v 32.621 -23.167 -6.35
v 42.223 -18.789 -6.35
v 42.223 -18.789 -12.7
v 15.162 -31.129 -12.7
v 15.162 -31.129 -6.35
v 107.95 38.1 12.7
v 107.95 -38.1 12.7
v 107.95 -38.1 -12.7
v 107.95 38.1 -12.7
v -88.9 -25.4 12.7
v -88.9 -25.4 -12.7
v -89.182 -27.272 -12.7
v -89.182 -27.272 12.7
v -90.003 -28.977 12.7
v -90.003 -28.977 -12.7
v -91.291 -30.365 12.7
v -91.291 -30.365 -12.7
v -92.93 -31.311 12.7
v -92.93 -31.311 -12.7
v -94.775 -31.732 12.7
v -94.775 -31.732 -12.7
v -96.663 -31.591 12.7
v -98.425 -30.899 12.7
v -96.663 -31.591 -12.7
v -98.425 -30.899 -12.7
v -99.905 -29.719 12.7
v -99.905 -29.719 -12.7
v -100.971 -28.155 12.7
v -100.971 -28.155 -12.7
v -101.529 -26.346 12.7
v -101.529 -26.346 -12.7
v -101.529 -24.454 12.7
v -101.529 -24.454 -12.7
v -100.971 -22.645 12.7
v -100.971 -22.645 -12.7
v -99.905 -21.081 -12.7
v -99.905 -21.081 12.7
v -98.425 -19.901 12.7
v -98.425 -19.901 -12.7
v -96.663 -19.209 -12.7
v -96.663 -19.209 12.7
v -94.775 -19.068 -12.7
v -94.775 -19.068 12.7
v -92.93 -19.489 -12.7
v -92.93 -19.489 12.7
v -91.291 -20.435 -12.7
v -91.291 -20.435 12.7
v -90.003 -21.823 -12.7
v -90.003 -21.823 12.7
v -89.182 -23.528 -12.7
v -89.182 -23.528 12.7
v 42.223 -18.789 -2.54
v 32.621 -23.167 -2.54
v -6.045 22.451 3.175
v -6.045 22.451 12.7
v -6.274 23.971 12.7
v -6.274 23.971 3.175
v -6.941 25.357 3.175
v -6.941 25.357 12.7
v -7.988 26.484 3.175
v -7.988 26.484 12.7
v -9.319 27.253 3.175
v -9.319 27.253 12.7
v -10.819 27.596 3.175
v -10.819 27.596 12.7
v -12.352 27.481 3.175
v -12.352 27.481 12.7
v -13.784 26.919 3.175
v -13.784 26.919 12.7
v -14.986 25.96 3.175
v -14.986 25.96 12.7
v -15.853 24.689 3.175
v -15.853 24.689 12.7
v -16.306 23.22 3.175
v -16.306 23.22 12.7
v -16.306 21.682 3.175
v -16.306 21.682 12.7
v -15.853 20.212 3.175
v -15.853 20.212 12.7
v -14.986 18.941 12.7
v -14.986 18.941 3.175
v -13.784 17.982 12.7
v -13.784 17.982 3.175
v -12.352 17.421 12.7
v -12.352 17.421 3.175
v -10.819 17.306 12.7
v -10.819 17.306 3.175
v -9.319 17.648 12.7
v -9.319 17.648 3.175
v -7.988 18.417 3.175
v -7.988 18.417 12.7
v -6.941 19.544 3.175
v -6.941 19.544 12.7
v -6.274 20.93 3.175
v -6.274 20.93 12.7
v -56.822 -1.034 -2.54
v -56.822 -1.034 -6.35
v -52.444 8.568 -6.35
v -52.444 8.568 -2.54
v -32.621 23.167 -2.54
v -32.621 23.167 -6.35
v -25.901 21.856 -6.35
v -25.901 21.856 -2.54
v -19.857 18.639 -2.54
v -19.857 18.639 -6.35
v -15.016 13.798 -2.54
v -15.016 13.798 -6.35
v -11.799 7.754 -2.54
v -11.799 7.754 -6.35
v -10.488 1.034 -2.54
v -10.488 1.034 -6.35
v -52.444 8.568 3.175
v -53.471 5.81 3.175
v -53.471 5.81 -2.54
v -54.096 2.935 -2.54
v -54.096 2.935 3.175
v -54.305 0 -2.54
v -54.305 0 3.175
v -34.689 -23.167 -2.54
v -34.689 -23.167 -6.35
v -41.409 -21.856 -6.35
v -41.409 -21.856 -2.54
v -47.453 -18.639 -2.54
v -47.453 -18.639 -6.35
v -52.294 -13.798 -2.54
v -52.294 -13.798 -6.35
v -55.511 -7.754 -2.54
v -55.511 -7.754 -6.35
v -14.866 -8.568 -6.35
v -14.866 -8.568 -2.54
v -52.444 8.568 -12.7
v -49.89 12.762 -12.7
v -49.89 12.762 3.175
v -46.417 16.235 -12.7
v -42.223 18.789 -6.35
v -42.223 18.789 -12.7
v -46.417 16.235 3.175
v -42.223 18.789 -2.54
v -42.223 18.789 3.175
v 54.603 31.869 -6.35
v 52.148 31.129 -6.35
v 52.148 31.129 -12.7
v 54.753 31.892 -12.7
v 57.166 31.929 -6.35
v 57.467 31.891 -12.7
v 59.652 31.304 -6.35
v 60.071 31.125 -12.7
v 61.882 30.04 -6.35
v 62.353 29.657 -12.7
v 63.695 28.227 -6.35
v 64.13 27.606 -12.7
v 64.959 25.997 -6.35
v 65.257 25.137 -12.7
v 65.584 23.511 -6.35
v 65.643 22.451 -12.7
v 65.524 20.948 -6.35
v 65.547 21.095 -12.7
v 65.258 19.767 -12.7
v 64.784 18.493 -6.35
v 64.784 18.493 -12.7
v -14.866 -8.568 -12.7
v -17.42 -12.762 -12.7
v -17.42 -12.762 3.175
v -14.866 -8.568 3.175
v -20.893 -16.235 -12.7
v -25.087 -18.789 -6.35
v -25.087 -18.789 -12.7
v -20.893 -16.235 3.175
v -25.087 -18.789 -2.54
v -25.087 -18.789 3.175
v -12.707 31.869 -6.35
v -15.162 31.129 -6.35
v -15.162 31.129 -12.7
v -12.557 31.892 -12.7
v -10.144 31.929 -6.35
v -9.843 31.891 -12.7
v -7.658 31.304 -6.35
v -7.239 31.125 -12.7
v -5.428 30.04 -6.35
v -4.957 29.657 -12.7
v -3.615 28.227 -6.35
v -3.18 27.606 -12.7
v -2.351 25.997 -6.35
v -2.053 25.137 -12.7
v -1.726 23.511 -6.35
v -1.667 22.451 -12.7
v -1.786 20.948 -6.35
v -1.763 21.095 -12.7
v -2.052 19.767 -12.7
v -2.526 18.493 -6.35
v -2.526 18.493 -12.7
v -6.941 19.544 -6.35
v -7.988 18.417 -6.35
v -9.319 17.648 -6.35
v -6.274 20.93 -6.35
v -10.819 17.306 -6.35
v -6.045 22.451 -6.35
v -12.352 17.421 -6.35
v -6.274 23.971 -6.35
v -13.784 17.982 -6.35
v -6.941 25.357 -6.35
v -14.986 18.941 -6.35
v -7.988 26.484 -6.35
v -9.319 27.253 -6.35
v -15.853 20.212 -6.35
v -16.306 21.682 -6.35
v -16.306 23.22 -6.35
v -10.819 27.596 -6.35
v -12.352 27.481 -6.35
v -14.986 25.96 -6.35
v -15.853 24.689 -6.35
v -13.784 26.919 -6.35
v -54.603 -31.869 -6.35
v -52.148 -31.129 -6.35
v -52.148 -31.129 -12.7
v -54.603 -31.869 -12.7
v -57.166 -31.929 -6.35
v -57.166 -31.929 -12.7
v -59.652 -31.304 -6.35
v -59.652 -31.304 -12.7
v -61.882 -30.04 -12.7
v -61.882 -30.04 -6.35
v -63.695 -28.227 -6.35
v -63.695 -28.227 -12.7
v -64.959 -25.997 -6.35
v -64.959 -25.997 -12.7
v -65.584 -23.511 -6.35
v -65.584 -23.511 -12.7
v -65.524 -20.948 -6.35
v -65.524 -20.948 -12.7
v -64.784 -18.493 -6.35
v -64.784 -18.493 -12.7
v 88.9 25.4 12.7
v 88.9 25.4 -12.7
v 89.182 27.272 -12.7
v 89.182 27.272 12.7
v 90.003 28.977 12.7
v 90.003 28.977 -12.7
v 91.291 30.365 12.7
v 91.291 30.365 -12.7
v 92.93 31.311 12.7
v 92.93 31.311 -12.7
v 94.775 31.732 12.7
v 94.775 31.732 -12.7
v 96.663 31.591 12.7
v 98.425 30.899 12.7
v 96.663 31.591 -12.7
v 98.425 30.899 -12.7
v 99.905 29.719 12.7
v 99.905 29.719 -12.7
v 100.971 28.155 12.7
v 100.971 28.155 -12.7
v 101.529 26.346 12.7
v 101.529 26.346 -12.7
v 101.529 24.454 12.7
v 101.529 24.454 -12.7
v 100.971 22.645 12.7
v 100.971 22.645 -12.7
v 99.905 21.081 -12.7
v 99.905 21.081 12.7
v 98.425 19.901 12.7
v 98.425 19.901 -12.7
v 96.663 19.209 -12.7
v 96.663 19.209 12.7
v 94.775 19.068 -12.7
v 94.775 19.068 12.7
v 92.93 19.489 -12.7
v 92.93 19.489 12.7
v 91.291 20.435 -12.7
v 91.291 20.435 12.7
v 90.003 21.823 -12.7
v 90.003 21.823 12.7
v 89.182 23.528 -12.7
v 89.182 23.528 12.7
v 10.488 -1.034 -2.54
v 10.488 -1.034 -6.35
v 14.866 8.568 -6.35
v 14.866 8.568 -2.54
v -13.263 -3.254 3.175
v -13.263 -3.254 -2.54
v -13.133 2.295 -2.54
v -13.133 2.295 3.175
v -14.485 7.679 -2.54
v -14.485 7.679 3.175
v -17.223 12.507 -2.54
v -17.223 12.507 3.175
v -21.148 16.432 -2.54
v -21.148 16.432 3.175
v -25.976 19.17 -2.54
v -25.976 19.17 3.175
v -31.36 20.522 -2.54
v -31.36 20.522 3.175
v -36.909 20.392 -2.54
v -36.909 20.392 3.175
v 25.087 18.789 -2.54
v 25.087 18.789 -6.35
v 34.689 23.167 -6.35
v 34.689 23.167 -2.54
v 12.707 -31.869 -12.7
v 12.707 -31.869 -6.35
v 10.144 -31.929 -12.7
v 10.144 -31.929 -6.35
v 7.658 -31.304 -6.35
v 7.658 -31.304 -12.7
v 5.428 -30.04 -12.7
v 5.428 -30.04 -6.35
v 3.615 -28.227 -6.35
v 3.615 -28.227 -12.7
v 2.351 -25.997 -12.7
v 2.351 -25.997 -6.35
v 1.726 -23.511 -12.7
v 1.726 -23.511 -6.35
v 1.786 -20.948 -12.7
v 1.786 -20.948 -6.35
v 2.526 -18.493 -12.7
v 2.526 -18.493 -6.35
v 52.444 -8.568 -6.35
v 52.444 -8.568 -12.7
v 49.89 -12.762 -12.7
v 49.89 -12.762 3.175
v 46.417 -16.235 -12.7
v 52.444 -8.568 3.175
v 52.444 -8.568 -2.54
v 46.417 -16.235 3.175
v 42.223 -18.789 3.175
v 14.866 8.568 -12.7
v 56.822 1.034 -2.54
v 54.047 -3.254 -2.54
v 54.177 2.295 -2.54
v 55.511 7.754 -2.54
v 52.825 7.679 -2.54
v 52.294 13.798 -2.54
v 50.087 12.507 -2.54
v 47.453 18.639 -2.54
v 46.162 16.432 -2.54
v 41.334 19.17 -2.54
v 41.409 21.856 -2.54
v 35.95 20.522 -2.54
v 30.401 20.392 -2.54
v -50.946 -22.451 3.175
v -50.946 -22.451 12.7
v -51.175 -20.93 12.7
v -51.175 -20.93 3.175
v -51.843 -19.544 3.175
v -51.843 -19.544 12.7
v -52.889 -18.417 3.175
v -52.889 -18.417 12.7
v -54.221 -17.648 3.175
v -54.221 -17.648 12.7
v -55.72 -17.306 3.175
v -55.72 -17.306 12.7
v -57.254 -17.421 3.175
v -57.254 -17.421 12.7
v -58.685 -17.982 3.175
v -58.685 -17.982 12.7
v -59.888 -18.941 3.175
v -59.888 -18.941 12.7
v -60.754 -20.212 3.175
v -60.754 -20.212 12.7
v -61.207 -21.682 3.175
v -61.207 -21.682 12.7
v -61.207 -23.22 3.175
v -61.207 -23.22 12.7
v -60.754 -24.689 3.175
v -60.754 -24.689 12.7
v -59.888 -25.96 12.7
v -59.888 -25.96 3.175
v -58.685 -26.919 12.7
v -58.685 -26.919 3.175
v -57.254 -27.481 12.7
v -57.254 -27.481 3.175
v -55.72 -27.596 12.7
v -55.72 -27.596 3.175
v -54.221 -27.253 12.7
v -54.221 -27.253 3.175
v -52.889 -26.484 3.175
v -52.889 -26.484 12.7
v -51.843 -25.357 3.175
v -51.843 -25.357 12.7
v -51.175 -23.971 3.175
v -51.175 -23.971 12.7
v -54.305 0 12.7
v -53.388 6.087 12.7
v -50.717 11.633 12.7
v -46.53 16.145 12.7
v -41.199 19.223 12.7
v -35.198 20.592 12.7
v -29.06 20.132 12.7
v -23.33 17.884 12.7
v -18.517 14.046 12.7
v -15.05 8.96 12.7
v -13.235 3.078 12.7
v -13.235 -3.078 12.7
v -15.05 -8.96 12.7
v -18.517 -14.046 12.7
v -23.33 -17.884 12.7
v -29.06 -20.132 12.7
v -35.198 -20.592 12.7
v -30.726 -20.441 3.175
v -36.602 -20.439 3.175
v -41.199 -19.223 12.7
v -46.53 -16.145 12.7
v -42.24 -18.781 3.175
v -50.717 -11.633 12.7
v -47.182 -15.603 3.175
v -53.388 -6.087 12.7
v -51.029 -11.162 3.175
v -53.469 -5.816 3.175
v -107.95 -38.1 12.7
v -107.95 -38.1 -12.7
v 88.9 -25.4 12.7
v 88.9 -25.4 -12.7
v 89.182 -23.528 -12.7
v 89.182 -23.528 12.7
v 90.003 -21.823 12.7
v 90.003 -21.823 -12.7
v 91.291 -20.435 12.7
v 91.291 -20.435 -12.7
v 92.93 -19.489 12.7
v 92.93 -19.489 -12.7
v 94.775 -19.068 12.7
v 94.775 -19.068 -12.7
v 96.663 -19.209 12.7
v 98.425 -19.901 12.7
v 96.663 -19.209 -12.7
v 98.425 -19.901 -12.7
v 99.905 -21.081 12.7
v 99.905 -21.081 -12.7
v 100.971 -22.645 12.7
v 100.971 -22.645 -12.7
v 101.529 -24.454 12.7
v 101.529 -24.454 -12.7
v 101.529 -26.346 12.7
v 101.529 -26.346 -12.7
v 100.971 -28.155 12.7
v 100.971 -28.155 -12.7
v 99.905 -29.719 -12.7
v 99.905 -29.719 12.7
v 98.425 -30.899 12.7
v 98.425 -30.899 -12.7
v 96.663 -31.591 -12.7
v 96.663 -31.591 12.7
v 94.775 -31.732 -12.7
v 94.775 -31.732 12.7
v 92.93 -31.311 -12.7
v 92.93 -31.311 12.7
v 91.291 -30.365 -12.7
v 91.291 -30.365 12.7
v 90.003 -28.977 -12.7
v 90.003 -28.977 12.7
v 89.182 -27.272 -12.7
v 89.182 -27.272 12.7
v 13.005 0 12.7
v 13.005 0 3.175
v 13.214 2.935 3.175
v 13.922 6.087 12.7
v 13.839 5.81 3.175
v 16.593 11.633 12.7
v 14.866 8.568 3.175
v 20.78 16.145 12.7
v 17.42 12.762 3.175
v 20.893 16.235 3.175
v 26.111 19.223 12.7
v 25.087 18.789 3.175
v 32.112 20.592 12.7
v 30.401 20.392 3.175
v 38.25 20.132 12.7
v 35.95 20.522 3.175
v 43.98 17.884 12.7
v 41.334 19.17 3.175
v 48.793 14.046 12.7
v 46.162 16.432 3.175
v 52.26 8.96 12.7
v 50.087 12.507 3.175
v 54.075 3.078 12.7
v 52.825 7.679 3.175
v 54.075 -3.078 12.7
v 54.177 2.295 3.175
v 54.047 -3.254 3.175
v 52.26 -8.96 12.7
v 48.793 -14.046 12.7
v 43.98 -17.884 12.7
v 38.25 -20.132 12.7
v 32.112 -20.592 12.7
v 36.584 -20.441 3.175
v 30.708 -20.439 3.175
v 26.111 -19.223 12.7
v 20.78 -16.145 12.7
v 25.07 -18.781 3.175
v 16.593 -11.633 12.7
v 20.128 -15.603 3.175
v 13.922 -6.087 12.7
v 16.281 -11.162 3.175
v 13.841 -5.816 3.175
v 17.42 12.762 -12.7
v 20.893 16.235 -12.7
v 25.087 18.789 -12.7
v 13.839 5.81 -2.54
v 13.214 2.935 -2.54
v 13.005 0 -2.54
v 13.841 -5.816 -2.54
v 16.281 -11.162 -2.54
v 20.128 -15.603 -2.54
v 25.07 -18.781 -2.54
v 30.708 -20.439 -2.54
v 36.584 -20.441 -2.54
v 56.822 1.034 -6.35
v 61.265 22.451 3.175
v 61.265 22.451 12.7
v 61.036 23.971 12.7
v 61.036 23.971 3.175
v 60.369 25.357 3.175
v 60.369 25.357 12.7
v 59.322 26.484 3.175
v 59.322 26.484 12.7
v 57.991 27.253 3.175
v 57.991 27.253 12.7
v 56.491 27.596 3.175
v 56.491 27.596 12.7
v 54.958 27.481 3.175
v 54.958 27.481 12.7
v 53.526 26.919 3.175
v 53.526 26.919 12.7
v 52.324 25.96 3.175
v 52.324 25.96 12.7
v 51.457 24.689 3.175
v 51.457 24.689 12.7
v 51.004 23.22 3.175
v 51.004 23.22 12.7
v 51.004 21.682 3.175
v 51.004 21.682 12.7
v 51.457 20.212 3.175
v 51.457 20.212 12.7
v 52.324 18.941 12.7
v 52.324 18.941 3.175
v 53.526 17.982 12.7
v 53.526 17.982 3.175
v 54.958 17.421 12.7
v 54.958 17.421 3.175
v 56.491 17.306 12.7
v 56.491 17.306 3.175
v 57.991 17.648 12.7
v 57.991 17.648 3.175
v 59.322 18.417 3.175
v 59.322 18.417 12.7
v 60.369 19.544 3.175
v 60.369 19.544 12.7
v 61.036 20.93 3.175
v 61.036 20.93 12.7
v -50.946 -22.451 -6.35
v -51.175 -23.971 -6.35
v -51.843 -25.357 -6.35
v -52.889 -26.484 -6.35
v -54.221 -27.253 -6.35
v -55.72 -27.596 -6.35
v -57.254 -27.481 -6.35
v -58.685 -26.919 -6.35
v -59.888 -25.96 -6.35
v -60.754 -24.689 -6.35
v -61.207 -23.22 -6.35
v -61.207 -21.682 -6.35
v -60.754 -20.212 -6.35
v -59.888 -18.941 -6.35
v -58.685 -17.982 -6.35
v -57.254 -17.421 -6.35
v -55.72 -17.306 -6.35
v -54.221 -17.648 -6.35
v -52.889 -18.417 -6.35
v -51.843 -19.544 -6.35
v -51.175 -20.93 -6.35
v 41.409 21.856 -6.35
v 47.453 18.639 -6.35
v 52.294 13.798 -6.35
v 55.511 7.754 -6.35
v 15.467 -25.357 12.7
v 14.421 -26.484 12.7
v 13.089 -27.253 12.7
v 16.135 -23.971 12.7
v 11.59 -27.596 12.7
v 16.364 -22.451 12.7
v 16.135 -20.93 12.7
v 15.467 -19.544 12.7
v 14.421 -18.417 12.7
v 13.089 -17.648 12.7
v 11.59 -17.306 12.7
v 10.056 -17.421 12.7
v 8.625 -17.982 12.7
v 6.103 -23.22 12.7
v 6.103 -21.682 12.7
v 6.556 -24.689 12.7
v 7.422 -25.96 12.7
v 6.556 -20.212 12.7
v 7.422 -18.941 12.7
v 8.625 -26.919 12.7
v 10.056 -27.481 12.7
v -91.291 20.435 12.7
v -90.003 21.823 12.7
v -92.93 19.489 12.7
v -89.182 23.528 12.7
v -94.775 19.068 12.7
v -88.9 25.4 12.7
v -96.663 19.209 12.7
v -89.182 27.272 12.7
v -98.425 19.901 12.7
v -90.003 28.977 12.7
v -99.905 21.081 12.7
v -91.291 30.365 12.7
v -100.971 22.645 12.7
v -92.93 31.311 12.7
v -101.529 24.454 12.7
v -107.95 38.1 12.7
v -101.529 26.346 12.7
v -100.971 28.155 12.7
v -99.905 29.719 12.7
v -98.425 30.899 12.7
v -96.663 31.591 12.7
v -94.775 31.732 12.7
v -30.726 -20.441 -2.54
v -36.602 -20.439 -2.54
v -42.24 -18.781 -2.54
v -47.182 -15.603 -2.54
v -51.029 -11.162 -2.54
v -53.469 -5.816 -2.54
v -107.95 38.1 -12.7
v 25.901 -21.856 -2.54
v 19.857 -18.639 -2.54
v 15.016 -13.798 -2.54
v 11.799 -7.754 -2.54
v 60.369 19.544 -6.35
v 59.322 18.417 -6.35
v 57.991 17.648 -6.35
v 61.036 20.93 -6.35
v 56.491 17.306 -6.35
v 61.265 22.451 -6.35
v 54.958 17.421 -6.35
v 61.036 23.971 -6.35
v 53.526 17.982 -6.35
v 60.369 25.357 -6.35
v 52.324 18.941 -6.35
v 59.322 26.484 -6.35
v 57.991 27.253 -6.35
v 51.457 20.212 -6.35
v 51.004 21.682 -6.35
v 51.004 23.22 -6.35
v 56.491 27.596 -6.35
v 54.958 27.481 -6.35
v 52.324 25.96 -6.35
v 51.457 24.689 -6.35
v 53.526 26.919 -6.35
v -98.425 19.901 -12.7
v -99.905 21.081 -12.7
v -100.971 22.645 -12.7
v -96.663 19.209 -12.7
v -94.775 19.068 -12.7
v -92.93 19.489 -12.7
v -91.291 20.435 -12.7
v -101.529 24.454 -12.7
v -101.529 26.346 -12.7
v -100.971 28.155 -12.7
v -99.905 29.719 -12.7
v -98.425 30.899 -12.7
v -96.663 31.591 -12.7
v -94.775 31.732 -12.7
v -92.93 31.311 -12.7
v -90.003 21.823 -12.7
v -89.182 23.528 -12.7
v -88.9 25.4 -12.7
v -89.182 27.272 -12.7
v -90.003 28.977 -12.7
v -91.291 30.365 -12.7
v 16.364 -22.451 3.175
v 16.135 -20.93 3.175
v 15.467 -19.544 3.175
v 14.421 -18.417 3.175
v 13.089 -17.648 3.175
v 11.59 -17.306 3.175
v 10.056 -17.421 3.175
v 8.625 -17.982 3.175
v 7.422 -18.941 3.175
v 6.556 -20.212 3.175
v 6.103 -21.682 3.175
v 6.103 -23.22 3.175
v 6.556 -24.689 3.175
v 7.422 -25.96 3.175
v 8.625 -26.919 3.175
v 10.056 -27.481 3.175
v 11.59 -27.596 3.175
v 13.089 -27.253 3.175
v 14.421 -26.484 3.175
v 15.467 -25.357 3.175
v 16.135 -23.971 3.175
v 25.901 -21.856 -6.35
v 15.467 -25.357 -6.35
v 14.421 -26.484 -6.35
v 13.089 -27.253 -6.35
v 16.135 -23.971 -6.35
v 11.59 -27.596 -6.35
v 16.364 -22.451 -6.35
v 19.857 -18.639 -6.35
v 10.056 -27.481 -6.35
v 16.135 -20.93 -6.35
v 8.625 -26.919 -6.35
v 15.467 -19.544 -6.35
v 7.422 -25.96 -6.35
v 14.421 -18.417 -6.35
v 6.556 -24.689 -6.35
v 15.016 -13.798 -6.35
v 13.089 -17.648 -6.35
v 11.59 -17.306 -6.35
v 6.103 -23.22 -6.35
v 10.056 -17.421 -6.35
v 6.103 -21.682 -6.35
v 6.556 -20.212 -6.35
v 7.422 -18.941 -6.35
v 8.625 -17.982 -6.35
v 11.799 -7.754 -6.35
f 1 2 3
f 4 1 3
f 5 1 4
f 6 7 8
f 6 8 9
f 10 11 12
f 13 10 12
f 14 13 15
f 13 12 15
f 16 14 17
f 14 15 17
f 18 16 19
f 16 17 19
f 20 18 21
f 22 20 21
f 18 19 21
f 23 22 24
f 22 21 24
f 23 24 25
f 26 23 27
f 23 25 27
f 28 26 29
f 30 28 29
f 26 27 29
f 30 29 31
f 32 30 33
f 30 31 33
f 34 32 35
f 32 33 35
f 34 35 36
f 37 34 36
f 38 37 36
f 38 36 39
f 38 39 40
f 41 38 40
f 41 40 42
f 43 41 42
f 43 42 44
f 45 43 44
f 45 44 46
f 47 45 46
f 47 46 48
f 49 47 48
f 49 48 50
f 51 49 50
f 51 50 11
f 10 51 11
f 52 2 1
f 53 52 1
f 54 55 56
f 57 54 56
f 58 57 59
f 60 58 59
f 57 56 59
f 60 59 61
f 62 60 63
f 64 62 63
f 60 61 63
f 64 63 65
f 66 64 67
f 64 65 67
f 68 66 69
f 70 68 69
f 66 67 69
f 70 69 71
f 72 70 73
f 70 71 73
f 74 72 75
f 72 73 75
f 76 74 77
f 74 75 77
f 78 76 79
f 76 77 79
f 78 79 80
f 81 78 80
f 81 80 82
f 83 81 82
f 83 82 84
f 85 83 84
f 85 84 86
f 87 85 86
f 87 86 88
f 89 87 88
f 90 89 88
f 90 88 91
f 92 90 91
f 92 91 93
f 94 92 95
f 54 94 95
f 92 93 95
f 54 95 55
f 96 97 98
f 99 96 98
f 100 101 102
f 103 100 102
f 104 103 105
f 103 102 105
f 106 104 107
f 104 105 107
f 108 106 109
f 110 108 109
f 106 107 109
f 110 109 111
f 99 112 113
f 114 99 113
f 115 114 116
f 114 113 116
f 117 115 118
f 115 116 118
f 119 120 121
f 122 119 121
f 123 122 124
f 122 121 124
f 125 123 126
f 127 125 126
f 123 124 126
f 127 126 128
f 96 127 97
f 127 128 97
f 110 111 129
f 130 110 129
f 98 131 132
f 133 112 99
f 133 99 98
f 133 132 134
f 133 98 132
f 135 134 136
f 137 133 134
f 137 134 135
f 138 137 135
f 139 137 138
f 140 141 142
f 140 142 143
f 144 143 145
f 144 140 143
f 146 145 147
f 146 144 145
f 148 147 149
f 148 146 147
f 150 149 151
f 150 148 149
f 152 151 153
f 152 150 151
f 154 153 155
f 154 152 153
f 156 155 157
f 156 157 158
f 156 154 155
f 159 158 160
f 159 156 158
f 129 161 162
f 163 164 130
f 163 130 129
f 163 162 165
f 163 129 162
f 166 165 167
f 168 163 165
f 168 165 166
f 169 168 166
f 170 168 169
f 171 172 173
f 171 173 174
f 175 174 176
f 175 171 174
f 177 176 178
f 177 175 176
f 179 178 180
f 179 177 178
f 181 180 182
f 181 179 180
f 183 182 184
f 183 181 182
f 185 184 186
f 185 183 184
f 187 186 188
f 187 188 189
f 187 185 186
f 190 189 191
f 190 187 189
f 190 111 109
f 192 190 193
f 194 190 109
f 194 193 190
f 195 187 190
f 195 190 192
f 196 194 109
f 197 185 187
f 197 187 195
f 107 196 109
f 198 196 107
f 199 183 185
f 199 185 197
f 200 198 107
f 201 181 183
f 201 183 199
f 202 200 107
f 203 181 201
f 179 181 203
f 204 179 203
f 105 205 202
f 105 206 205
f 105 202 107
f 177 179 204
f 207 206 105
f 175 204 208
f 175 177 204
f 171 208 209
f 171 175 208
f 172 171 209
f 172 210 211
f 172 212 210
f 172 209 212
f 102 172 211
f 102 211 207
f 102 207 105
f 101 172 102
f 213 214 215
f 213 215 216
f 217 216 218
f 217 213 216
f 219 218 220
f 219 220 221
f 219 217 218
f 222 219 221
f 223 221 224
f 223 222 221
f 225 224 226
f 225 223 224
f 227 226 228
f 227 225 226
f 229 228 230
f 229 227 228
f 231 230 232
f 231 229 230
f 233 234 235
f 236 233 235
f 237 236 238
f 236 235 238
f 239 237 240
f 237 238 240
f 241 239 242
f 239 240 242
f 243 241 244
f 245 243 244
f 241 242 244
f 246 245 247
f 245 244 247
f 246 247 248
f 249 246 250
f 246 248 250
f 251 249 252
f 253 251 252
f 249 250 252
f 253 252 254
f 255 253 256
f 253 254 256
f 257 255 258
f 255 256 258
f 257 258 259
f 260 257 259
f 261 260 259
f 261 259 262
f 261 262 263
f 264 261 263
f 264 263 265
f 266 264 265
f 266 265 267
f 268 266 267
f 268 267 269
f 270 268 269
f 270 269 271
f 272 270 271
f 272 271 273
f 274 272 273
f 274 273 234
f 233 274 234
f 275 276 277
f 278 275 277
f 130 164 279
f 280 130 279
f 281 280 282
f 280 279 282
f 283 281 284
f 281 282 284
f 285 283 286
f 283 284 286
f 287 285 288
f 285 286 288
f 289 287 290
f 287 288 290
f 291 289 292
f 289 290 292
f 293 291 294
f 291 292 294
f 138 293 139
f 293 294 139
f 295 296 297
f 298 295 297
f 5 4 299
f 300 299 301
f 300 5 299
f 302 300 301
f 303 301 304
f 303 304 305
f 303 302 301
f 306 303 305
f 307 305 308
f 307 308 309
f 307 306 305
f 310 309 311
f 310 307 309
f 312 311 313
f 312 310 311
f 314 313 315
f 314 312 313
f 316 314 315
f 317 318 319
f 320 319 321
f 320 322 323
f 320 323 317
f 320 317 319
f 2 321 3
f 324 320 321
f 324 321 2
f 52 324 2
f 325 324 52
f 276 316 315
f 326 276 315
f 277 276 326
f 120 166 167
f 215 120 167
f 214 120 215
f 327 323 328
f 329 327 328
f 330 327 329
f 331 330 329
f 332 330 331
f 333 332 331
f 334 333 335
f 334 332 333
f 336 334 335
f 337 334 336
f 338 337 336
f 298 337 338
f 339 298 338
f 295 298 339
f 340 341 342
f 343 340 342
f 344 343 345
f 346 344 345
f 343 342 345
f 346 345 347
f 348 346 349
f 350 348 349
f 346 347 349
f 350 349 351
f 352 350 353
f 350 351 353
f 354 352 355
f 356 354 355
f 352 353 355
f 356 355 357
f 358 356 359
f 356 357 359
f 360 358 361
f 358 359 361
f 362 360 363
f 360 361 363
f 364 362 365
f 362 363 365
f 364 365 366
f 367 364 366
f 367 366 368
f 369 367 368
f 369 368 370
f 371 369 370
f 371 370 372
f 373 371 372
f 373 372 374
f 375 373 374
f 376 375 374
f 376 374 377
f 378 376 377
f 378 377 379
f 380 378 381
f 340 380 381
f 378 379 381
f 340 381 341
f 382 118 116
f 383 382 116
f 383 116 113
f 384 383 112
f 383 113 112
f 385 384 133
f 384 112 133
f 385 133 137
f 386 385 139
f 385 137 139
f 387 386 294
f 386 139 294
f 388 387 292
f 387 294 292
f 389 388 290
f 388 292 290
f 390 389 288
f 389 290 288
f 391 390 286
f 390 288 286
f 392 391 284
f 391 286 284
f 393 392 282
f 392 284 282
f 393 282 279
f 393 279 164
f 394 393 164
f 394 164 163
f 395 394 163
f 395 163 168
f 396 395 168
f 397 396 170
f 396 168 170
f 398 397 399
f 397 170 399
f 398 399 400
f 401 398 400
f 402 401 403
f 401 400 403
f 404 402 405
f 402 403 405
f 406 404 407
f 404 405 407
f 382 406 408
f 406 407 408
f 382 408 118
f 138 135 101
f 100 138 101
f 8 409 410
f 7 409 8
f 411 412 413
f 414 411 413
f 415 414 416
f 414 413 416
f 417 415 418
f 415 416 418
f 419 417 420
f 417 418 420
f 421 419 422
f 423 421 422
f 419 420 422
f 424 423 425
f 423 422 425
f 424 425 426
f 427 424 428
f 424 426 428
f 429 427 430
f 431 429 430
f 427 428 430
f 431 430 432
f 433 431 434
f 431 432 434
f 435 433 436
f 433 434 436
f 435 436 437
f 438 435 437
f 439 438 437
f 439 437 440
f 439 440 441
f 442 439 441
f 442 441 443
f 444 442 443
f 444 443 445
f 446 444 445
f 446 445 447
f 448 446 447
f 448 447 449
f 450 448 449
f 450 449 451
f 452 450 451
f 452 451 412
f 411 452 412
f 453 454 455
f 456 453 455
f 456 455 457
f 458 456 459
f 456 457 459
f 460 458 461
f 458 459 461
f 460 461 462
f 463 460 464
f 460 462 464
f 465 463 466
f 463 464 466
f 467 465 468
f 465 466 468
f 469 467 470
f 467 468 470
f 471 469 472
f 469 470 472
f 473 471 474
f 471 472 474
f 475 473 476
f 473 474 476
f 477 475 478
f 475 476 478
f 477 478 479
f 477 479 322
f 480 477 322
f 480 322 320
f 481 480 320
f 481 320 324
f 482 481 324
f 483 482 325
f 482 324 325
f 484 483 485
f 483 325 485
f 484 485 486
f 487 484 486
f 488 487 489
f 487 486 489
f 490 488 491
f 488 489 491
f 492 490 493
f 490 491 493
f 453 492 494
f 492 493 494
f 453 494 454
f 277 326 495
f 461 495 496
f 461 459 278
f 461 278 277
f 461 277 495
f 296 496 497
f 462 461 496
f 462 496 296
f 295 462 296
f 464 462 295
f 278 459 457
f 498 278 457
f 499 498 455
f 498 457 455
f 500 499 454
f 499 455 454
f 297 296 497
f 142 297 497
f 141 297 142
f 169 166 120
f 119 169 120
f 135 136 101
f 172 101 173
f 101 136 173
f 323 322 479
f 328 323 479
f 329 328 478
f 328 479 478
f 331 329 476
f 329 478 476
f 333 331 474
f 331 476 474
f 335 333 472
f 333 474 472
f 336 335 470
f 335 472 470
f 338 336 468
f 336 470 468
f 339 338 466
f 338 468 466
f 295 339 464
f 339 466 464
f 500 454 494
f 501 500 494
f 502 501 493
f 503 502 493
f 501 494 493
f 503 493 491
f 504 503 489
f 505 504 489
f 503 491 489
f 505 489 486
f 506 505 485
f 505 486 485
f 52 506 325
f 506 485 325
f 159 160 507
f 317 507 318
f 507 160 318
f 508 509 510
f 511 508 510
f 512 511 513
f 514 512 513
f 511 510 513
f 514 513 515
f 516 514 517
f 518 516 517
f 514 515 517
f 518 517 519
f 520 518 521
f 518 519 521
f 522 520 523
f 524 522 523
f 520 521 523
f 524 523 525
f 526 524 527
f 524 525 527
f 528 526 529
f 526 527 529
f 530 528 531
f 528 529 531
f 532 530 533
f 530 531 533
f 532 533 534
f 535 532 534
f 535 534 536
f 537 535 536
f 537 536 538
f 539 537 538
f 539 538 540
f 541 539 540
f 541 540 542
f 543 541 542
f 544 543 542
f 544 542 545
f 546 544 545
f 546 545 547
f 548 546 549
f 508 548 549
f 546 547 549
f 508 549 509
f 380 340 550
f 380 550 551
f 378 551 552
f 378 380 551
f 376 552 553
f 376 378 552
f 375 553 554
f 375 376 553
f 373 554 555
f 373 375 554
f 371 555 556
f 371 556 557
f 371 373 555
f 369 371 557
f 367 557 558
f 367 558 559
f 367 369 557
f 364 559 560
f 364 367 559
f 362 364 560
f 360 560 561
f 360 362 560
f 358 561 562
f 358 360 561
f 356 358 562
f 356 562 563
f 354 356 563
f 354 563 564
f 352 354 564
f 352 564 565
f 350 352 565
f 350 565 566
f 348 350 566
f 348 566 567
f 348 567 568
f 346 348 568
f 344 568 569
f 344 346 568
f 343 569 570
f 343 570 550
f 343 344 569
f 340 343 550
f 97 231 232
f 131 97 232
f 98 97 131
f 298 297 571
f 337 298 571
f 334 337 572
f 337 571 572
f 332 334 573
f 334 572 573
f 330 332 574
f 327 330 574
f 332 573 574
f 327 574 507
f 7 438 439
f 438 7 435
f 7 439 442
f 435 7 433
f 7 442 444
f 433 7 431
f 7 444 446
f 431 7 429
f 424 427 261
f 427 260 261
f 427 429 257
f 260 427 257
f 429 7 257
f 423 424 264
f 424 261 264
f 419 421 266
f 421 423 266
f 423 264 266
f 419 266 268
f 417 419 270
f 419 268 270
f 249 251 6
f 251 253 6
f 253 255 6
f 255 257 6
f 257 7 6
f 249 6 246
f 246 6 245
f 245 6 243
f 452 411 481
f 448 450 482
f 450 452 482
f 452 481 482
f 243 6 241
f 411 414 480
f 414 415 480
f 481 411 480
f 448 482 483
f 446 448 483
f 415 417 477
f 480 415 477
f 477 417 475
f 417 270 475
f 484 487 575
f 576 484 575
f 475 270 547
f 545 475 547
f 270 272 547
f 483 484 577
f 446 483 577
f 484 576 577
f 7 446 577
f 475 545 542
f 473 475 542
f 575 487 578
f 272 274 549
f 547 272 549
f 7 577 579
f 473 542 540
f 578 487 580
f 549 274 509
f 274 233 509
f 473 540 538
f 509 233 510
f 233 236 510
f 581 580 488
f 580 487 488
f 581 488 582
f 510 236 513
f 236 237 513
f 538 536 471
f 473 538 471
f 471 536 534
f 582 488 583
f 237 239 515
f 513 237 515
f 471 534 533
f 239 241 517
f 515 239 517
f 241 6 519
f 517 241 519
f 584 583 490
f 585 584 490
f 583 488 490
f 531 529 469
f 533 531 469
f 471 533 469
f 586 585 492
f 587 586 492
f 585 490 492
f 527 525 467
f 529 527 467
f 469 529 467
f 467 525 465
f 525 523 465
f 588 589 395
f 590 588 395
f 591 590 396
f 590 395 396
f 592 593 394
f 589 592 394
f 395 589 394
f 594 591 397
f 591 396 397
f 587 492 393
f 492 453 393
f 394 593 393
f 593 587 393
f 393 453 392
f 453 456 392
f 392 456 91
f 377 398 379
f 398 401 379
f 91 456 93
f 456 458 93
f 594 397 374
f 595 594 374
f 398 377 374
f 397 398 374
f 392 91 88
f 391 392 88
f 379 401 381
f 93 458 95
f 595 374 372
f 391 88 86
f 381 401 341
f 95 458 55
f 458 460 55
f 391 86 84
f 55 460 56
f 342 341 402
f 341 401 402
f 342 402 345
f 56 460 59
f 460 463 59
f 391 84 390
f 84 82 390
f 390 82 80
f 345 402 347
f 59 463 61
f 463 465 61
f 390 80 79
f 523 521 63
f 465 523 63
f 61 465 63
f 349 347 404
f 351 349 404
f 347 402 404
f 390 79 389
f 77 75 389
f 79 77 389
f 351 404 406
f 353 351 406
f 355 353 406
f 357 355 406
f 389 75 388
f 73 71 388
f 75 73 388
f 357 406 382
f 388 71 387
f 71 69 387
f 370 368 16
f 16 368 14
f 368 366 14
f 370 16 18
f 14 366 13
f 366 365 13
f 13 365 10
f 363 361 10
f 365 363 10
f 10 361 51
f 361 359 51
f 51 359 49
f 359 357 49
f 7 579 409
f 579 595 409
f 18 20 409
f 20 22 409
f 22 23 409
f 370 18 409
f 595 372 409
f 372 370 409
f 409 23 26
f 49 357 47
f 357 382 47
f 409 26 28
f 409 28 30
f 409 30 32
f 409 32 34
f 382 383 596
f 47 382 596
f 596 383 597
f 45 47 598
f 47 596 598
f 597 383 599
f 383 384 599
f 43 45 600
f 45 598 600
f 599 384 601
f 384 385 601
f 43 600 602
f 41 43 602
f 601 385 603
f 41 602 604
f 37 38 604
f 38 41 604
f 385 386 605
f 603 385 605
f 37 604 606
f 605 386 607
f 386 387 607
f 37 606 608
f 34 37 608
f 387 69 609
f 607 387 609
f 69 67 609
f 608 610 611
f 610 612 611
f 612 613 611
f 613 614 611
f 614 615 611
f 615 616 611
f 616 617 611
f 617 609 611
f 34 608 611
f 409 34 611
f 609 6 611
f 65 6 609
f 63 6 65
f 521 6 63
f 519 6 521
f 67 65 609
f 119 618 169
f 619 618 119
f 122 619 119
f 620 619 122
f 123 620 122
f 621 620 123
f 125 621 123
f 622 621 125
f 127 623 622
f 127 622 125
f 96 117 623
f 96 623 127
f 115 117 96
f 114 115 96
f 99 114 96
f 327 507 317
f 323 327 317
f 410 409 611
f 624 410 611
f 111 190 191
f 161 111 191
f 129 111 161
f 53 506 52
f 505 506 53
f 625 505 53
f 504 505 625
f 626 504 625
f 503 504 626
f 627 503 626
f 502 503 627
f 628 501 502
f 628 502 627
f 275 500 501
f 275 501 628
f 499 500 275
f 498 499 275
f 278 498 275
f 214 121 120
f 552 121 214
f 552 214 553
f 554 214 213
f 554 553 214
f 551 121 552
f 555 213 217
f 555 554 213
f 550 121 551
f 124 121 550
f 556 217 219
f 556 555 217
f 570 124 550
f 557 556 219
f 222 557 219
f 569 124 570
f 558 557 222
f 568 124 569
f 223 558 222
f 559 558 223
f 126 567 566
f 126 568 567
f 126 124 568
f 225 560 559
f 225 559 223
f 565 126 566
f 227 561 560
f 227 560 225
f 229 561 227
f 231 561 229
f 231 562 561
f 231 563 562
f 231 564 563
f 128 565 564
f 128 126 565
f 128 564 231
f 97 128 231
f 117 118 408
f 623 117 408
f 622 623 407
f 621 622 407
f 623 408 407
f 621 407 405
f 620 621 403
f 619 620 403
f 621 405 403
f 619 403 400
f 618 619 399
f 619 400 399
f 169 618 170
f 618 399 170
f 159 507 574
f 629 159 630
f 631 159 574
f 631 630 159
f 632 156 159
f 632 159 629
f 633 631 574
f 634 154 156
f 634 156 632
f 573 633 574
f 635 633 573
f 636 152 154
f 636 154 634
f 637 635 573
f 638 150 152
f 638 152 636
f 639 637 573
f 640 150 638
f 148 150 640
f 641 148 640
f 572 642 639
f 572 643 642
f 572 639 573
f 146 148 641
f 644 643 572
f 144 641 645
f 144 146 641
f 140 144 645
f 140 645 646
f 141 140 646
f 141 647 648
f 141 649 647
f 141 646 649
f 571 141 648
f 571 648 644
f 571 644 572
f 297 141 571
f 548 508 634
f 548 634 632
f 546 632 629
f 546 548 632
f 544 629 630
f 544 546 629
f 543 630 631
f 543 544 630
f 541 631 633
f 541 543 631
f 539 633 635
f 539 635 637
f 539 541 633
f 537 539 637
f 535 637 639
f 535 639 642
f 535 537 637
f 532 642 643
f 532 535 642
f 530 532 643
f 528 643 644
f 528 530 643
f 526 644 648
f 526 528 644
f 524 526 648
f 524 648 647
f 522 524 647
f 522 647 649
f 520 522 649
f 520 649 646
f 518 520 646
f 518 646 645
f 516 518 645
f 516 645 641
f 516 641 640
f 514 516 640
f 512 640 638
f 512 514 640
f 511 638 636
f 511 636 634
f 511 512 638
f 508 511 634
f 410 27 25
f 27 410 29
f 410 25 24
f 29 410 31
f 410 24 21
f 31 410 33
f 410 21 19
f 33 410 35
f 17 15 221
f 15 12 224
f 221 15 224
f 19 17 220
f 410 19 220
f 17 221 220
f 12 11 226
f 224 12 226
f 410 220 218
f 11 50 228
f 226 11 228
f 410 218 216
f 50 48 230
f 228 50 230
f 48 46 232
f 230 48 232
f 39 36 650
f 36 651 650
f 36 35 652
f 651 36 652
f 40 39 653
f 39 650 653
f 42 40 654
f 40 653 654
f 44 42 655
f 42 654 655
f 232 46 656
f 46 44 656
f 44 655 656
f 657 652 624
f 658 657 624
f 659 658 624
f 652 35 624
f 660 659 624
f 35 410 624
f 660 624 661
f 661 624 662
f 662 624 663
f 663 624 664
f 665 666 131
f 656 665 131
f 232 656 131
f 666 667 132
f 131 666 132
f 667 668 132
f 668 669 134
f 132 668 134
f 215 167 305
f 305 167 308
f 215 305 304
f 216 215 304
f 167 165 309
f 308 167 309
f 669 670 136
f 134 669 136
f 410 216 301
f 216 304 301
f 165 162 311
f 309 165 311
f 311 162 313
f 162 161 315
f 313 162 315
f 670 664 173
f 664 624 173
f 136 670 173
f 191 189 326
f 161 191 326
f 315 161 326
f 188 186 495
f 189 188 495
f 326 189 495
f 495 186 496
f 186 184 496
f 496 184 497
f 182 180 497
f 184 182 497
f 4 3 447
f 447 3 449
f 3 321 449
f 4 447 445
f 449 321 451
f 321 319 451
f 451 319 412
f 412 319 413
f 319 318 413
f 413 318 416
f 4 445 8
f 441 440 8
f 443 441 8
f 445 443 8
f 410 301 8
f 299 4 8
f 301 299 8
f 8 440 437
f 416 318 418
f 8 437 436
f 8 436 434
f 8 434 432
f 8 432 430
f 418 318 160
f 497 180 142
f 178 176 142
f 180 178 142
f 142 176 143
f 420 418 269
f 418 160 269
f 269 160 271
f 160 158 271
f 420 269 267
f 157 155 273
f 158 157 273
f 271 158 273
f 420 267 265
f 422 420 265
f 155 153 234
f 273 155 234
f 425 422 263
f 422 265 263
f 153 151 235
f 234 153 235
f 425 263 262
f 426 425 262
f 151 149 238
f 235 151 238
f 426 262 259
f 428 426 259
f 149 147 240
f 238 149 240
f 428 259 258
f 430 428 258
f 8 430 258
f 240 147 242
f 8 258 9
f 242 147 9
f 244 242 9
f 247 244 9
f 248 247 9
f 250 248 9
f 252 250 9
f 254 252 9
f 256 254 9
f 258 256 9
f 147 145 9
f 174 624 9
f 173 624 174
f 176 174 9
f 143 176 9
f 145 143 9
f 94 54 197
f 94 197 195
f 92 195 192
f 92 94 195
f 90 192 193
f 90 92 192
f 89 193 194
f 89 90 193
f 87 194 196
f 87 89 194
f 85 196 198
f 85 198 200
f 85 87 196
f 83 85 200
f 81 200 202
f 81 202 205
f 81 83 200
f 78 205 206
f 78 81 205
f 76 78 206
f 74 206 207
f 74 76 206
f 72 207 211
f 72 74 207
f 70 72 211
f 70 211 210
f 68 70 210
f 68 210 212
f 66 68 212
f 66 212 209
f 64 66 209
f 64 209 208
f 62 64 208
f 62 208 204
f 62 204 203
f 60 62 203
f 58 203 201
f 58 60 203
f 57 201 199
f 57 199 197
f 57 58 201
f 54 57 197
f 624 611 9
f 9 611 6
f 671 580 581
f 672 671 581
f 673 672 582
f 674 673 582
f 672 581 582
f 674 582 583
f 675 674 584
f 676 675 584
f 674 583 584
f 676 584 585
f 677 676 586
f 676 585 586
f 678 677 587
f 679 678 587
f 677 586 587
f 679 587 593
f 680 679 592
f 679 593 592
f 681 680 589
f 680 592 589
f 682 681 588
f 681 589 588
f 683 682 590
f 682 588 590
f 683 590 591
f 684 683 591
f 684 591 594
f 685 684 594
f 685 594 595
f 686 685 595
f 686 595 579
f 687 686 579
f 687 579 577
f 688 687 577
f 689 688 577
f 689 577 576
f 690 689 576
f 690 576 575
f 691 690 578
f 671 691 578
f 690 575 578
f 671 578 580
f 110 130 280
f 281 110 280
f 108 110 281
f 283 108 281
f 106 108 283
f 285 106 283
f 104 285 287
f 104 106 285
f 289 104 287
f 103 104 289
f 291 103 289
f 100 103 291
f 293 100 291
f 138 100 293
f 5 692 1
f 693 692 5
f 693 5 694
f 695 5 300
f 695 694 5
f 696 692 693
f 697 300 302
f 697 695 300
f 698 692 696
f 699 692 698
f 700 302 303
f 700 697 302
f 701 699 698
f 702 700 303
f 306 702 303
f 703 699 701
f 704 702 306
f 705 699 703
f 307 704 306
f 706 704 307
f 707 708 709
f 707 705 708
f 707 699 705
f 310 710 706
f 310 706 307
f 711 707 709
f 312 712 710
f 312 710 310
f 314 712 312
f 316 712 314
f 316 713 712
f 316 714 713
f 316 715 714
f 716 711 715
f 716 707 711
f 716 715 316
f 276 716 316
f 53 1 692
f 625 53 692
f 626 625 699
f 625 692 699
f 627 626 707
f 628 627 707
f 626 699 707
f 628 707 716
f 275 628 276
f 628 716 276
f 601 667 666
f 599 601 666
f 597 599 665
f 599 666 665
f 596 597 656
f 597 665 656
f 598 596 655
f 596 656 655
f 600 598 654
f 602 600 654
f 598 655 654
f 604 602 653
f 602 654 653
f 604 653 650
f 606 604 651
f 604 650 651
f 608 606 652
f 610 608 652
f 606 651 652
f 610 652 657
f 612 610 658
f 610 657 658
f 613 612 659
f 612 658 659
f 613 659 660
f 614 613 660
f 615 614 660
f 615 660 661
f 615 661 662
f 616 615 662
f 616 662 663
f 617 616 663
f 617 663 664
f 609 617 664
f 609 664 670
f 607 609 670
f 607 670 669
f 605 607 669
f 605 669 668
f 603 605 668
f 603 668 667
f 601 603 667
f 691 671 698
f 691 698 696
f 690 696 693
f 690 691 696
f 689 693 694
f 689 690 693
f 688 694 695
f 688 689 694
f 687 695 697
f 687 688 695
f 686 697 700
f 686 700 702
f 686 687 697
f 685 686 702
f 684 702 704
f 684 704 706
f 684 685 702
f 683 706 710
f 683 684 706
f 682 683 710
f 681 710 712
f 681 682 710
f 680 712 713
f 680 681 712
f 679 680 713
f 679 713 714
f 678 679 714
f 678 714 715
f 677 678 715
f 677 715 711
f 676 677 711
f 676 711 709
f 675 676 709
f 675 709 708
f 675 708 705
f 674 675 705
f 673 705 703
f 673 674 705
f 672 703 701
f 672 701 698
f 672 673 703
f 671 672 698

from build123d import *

# Parameters (mm, degrees)
SKETCH1_W           = 215.9
SKETCH1_H           = 76.2
BOSS_EXTRUDE1_DEPTH = 12.7
SKETCH2_R           = 5.159375
SKETCH2_R_2         = 6.985
BOSS_EXTRUDE2_DEPTH = 9.525
SKETCH3_R           = 5.159375
BOSS_EXTRUDE3_DEPTH = 9.525
CUT_EXTRUDE1_DEPTH  = 3.81
LPATTERN1_COUNT     = 2
LPATTERN1_PITCH     = 67.31
SKETCH5_R           = 13.335
CUT_EXTRUDE2_DEPTH  = 2.54
SKETCH6_R           = 6.35
CUT_EXTRUDE3_DEPTH  = 118.260276735
SKETCH7_R           = 20.6502
CUT_EXTRUDE4_DEPTH  = 116.571744492


with BuildPart() as part:
    # Sketch1 → Boss-Extrude1 (new, symmetric)
    with BuildSketch(Plane.XY):
        Rectangle(SKETCH1_W, SKETCH1_H)
        with BuildLine():
            ThreePointArc((-52.148499203, -31.128702045), (-62.84981265, -29.19481265), (-64.783702045, -18.493499203))
            Line((-64.783702045, -18.493499203), (-52.443985877, 8.56765836))
            ThreePointArc((-52.443985877, 8.56765836), (-48.256896453, 14.601896453), (-42.22265836, 18.788985877))
            Line((-42.22265836, 18.788985877), (-15.161500797, 31.128702045))
            ThreePointArc((-15.161500797, 31.128702045), (-6.045595474, 30.472789203), (-1.666659697, 22.450640303))
            ThreePointArc((-1.666659697, 22.450640303), (-1.884046645, 20.42592158), (-2.526297955, 18.493499203))
            Line((-2.526297955, 18.493499203), (-14.866014123, -8.56765836))
            ThreePointArc((-14.866014123, -8.56765836), (-19.053103547, -14.601896453), (-25.08734164, -18.788985877))
            Line((-25.08734164, -18.788985877), (-52.148499203, -31.128702045))
        make_face(mode=Mode.SUBTRACT)
        with BuildLine():
            Line((64.783702045, 18.493499203), (52.443985877, -8.56765836))
            ThreePointArc((52.443985877, -8.56765836), (48.256896453, -14.601896453), (42.22265836, -18.788985877))
            Line((42.22265836, -18.788985877), (15.161500797, -31.128702045))
            ThreePointArc((15.161500797, -31.128702045), (4.46018735, -29.19481265), (2.526297955, -18.493499203))
            Line((2.526297955, -18.493499203), (14.866014123, 8.56765836))
            ThreePointArc((14.866014123, 8.56765836), (19.053103547, 14.601896453), (25.08734164, 18.788985877))
            Line((25.08734164, 18.788985877), (52.148499203, 31.128702045))
            ThreePointArc((52.148499203, 31.128702045), (61.264404526, 30.472789203), (65.643340303, 22.450640303))
            ThreePointArc((65.643340303, 22.450640303), (65.425953355, 20.42592158), (64.783702045, 18.493499203))
        make_face(mode=Mode.SUBTRACT)
    extrude(amount=BOSS_EXTRUDE1_DEPTH, both=True)

    # Sketch2 → Boss-Extrude2 (add)
    with BuildSketch(Plane.XY.offset(12.7)):
        with BuildLine():
            Line((-64.783702045, -18.493499203), (-52.443985877, 8.56765836))
            ThreePointArc((-52.443985877, 8.56765836), (-48.256896453, 14.601896453), (-42.22265836, 18.788985877))
            Line((-42.22265836, 18.788985877), (-15.161500797, 31.128702045))
            ThreePointArc((-15.161500797, 31.128702045), (-4.46018735, 29.19481265), (-2.526297955, 18.493499203))
            Line((-2.526297955, 18.493499203), (-14.866014123, -8.56765836))
            ThreePointArc((-14.866014123, -8.56765836), (-19.053103547, -14.601896453), (-25.08734164, -18.788985877))
            Line((-25.08734164, -18.788985877), (-52.148499203, -31.128702045))
            ThreePointArc((-52.148499203, -31.128702045), (-62.84981265, -29.19481265), (-64.783702045, -18.493499203))
        make_face()
        with Locations((-11.204359697, 22.450640303)):
            Circle(SKETCH2_R, mode=Mode.SUBTRACT)
        with Locations((-56.105640303, -22.450640303)):
            Circle(SKETCH2_R, mode=Mode.SUBTRACT)
        with Locations((-33.655, 0)):
            Circle(SKETCH2_R_2, mode=Mode.SUBTRACT)
    boss_extrude2 = extrude(amount=-BOSS_EXTRUDE2_DEPTH)

    # Sketch3 → Boss-Extrude3 (add)
    with BuildSketch(Plane(origin=(0, 0, 3.175), x_dir=(-1, 0, 0), z_dir=(0, 0, -1))):
        with BuildLine():
            ThreePointArc((14.866014123, -8.56765836), (19.053103547, 14.601896453), (42.22265836, 18.788985877))
            Line((42.22265836, 18.788985877), (15.161500797, 31.128702045))
            ThreePointArc((15.161500797, 31.128702045), (4.46018735, 29.19481265), (2.526297955, 18.493499203))
            Line((2.526297955, 18.493499203), (14.866014123, -8.56765836))
        make_face()
        with Locations(Location((11.204359697, 22.450640303, 0), (0, 0, 180))):
            Circle(SKETCH3_R, mode=Mode.SUBTRACT)
        with BuildLine():
            Line((64.783702045, -18.493499203), (52.443985877, 8.56765836))
            ThreePointArc((52.443985877, 8.56765836), (53.834532653, 4.383745196), (54.3052, 0))
            ThreePointArc((54.3052, 0), (44.824308425, -17.368860335), (25.08734164, -18.788985877))
            Line((25.08734164, -18.788985877), (52.148499203, -31.128702045))
            ThreePointArc((52.148499203, -31.128702045), (62.84981265, -29.19481265), (64.783702045, -18.493499203))
        make_face()
        with Locations(Location((56.105640303, -22.450640303, 0), (0, 0, 180))):
            Circle(SKETCH3_R, mode=Mode.SUBTRACT)
    boss_extrude3 = extrude(amount=BOSS_EXTRUDE3_DEPTH)

    # Sketch4 → Cut-Extrude1 (cut)
    with BuildSketch(Plane(origin=(0, 0, -6.35), x_dir=(-1, 0, 0), z_dir=(0, 0, -1))):
        with BuildLine():
            ThreePointArc((32.621288713, 23.167149523), (17.257052323, 16.397947677), (10.487850477, 1.033711287))
            Line((10.487850477, 1.033711287), (14.866014123, -8.56765836))
            ThreePointArc((14.866014123, -8.56765836), (19.053103547, 14.601896453), (42.22265836, 18.788985877))
            Line((42.22265836, 18.788985877), (32.621288713, 23.167149523))
        make_face()
        with BuildLine():
            Line((25.08734164, -18.788985877), (34.688711287, -23.167149523))
            ThreePointArc((34.688711287, -23.167149523), (50.052947677, -16.397947677), (56.822149523, -1.033711287))
            Line((56.822149523, -1.033711287), (52.443985877, 8.56765836))
            ThreePointArc((52.443985877, 8.56765836), (53.834532653, 4.383745196), (54.3052, 0))
            ThreePointArc((54.3052, 0), (44.824308425, -17.368860335), (25.08734164, -18.788985877))
        make_face()
    cut_extrude1 = extrude(amount=-CUT_EXTRUDE1_DEPTH, mode=Mode.SUBTRACT)

    # LPattern1: Boss-Extrude2, Boss-Extrude3, Cut-Extrude1 ×2
    with Locations(*[(i * LPATTERN1_PITCH, 0, 0) for i in range(1, LPATTERN1_COUNT)]):
        add(boss_extrude2)
        add(boss_extrude3)
        add(cut_extrude1, mode=Mode.SUBTRACT)

    # Sketch5 → Cut-Extrude2 (cut)
    with BuildSketch(Plane(origin=(0, 0, 3.175), x_dir=(-1, 0, 0), z_dir=(0, 0, -1))):
        with Locations((33.655, 0)):
            Circle(SKETCH5_R)
        with Locations((-33.655, 0)):
            Circle(SKETCH5_R)
    extrude(amount=-CUT_EXTRUDE2_DEPTH, mode=Mode.SUBTRACT)

    # Sketch6 → Cut-Extrude3 (cut, through all)
    with BuildSketch(Plane(origin=(0, 0, -12.7), x_dir=(-1, 0, 0), z_dir=(0, 0, -1))):
        with Locations((-95.25, 25.4)):
            Circle(SKETCH6_R)
        with Locations((-95.25, -25.4)):
            Circle(SKETCH6_R)
        with Locations(Location((95.25, -25.4, 0), (0, 0, 180))):
            Circle(SKETCH6_R)
        with Locations(Location((95.25, 25.4, 0), (0, 0, 180))):
            Circle(SKETCH6_R)
    extrude(amount=-CUT_EXTRUDE3_DEPTH, mode=Mode.SUBTRACT)

    # Sketch7 → Cut-Extrude4 (cut, through all)
    with BuildSketch(Plane(origin=(0, 0, 3.175), x_dir=(-1, 0, 0), z_dir=(0, 0, -1))):
        with Locations((-33.655, 0)):
            Circle(SKETCH7_R)
        with Locations((33.655, 0)):
            Circle(SKETCH7_R)
    extrude(amount=-CUT_EXTRUDE4_DEPTH, mode=Mode.SUBTRACT)


solid = part.part
